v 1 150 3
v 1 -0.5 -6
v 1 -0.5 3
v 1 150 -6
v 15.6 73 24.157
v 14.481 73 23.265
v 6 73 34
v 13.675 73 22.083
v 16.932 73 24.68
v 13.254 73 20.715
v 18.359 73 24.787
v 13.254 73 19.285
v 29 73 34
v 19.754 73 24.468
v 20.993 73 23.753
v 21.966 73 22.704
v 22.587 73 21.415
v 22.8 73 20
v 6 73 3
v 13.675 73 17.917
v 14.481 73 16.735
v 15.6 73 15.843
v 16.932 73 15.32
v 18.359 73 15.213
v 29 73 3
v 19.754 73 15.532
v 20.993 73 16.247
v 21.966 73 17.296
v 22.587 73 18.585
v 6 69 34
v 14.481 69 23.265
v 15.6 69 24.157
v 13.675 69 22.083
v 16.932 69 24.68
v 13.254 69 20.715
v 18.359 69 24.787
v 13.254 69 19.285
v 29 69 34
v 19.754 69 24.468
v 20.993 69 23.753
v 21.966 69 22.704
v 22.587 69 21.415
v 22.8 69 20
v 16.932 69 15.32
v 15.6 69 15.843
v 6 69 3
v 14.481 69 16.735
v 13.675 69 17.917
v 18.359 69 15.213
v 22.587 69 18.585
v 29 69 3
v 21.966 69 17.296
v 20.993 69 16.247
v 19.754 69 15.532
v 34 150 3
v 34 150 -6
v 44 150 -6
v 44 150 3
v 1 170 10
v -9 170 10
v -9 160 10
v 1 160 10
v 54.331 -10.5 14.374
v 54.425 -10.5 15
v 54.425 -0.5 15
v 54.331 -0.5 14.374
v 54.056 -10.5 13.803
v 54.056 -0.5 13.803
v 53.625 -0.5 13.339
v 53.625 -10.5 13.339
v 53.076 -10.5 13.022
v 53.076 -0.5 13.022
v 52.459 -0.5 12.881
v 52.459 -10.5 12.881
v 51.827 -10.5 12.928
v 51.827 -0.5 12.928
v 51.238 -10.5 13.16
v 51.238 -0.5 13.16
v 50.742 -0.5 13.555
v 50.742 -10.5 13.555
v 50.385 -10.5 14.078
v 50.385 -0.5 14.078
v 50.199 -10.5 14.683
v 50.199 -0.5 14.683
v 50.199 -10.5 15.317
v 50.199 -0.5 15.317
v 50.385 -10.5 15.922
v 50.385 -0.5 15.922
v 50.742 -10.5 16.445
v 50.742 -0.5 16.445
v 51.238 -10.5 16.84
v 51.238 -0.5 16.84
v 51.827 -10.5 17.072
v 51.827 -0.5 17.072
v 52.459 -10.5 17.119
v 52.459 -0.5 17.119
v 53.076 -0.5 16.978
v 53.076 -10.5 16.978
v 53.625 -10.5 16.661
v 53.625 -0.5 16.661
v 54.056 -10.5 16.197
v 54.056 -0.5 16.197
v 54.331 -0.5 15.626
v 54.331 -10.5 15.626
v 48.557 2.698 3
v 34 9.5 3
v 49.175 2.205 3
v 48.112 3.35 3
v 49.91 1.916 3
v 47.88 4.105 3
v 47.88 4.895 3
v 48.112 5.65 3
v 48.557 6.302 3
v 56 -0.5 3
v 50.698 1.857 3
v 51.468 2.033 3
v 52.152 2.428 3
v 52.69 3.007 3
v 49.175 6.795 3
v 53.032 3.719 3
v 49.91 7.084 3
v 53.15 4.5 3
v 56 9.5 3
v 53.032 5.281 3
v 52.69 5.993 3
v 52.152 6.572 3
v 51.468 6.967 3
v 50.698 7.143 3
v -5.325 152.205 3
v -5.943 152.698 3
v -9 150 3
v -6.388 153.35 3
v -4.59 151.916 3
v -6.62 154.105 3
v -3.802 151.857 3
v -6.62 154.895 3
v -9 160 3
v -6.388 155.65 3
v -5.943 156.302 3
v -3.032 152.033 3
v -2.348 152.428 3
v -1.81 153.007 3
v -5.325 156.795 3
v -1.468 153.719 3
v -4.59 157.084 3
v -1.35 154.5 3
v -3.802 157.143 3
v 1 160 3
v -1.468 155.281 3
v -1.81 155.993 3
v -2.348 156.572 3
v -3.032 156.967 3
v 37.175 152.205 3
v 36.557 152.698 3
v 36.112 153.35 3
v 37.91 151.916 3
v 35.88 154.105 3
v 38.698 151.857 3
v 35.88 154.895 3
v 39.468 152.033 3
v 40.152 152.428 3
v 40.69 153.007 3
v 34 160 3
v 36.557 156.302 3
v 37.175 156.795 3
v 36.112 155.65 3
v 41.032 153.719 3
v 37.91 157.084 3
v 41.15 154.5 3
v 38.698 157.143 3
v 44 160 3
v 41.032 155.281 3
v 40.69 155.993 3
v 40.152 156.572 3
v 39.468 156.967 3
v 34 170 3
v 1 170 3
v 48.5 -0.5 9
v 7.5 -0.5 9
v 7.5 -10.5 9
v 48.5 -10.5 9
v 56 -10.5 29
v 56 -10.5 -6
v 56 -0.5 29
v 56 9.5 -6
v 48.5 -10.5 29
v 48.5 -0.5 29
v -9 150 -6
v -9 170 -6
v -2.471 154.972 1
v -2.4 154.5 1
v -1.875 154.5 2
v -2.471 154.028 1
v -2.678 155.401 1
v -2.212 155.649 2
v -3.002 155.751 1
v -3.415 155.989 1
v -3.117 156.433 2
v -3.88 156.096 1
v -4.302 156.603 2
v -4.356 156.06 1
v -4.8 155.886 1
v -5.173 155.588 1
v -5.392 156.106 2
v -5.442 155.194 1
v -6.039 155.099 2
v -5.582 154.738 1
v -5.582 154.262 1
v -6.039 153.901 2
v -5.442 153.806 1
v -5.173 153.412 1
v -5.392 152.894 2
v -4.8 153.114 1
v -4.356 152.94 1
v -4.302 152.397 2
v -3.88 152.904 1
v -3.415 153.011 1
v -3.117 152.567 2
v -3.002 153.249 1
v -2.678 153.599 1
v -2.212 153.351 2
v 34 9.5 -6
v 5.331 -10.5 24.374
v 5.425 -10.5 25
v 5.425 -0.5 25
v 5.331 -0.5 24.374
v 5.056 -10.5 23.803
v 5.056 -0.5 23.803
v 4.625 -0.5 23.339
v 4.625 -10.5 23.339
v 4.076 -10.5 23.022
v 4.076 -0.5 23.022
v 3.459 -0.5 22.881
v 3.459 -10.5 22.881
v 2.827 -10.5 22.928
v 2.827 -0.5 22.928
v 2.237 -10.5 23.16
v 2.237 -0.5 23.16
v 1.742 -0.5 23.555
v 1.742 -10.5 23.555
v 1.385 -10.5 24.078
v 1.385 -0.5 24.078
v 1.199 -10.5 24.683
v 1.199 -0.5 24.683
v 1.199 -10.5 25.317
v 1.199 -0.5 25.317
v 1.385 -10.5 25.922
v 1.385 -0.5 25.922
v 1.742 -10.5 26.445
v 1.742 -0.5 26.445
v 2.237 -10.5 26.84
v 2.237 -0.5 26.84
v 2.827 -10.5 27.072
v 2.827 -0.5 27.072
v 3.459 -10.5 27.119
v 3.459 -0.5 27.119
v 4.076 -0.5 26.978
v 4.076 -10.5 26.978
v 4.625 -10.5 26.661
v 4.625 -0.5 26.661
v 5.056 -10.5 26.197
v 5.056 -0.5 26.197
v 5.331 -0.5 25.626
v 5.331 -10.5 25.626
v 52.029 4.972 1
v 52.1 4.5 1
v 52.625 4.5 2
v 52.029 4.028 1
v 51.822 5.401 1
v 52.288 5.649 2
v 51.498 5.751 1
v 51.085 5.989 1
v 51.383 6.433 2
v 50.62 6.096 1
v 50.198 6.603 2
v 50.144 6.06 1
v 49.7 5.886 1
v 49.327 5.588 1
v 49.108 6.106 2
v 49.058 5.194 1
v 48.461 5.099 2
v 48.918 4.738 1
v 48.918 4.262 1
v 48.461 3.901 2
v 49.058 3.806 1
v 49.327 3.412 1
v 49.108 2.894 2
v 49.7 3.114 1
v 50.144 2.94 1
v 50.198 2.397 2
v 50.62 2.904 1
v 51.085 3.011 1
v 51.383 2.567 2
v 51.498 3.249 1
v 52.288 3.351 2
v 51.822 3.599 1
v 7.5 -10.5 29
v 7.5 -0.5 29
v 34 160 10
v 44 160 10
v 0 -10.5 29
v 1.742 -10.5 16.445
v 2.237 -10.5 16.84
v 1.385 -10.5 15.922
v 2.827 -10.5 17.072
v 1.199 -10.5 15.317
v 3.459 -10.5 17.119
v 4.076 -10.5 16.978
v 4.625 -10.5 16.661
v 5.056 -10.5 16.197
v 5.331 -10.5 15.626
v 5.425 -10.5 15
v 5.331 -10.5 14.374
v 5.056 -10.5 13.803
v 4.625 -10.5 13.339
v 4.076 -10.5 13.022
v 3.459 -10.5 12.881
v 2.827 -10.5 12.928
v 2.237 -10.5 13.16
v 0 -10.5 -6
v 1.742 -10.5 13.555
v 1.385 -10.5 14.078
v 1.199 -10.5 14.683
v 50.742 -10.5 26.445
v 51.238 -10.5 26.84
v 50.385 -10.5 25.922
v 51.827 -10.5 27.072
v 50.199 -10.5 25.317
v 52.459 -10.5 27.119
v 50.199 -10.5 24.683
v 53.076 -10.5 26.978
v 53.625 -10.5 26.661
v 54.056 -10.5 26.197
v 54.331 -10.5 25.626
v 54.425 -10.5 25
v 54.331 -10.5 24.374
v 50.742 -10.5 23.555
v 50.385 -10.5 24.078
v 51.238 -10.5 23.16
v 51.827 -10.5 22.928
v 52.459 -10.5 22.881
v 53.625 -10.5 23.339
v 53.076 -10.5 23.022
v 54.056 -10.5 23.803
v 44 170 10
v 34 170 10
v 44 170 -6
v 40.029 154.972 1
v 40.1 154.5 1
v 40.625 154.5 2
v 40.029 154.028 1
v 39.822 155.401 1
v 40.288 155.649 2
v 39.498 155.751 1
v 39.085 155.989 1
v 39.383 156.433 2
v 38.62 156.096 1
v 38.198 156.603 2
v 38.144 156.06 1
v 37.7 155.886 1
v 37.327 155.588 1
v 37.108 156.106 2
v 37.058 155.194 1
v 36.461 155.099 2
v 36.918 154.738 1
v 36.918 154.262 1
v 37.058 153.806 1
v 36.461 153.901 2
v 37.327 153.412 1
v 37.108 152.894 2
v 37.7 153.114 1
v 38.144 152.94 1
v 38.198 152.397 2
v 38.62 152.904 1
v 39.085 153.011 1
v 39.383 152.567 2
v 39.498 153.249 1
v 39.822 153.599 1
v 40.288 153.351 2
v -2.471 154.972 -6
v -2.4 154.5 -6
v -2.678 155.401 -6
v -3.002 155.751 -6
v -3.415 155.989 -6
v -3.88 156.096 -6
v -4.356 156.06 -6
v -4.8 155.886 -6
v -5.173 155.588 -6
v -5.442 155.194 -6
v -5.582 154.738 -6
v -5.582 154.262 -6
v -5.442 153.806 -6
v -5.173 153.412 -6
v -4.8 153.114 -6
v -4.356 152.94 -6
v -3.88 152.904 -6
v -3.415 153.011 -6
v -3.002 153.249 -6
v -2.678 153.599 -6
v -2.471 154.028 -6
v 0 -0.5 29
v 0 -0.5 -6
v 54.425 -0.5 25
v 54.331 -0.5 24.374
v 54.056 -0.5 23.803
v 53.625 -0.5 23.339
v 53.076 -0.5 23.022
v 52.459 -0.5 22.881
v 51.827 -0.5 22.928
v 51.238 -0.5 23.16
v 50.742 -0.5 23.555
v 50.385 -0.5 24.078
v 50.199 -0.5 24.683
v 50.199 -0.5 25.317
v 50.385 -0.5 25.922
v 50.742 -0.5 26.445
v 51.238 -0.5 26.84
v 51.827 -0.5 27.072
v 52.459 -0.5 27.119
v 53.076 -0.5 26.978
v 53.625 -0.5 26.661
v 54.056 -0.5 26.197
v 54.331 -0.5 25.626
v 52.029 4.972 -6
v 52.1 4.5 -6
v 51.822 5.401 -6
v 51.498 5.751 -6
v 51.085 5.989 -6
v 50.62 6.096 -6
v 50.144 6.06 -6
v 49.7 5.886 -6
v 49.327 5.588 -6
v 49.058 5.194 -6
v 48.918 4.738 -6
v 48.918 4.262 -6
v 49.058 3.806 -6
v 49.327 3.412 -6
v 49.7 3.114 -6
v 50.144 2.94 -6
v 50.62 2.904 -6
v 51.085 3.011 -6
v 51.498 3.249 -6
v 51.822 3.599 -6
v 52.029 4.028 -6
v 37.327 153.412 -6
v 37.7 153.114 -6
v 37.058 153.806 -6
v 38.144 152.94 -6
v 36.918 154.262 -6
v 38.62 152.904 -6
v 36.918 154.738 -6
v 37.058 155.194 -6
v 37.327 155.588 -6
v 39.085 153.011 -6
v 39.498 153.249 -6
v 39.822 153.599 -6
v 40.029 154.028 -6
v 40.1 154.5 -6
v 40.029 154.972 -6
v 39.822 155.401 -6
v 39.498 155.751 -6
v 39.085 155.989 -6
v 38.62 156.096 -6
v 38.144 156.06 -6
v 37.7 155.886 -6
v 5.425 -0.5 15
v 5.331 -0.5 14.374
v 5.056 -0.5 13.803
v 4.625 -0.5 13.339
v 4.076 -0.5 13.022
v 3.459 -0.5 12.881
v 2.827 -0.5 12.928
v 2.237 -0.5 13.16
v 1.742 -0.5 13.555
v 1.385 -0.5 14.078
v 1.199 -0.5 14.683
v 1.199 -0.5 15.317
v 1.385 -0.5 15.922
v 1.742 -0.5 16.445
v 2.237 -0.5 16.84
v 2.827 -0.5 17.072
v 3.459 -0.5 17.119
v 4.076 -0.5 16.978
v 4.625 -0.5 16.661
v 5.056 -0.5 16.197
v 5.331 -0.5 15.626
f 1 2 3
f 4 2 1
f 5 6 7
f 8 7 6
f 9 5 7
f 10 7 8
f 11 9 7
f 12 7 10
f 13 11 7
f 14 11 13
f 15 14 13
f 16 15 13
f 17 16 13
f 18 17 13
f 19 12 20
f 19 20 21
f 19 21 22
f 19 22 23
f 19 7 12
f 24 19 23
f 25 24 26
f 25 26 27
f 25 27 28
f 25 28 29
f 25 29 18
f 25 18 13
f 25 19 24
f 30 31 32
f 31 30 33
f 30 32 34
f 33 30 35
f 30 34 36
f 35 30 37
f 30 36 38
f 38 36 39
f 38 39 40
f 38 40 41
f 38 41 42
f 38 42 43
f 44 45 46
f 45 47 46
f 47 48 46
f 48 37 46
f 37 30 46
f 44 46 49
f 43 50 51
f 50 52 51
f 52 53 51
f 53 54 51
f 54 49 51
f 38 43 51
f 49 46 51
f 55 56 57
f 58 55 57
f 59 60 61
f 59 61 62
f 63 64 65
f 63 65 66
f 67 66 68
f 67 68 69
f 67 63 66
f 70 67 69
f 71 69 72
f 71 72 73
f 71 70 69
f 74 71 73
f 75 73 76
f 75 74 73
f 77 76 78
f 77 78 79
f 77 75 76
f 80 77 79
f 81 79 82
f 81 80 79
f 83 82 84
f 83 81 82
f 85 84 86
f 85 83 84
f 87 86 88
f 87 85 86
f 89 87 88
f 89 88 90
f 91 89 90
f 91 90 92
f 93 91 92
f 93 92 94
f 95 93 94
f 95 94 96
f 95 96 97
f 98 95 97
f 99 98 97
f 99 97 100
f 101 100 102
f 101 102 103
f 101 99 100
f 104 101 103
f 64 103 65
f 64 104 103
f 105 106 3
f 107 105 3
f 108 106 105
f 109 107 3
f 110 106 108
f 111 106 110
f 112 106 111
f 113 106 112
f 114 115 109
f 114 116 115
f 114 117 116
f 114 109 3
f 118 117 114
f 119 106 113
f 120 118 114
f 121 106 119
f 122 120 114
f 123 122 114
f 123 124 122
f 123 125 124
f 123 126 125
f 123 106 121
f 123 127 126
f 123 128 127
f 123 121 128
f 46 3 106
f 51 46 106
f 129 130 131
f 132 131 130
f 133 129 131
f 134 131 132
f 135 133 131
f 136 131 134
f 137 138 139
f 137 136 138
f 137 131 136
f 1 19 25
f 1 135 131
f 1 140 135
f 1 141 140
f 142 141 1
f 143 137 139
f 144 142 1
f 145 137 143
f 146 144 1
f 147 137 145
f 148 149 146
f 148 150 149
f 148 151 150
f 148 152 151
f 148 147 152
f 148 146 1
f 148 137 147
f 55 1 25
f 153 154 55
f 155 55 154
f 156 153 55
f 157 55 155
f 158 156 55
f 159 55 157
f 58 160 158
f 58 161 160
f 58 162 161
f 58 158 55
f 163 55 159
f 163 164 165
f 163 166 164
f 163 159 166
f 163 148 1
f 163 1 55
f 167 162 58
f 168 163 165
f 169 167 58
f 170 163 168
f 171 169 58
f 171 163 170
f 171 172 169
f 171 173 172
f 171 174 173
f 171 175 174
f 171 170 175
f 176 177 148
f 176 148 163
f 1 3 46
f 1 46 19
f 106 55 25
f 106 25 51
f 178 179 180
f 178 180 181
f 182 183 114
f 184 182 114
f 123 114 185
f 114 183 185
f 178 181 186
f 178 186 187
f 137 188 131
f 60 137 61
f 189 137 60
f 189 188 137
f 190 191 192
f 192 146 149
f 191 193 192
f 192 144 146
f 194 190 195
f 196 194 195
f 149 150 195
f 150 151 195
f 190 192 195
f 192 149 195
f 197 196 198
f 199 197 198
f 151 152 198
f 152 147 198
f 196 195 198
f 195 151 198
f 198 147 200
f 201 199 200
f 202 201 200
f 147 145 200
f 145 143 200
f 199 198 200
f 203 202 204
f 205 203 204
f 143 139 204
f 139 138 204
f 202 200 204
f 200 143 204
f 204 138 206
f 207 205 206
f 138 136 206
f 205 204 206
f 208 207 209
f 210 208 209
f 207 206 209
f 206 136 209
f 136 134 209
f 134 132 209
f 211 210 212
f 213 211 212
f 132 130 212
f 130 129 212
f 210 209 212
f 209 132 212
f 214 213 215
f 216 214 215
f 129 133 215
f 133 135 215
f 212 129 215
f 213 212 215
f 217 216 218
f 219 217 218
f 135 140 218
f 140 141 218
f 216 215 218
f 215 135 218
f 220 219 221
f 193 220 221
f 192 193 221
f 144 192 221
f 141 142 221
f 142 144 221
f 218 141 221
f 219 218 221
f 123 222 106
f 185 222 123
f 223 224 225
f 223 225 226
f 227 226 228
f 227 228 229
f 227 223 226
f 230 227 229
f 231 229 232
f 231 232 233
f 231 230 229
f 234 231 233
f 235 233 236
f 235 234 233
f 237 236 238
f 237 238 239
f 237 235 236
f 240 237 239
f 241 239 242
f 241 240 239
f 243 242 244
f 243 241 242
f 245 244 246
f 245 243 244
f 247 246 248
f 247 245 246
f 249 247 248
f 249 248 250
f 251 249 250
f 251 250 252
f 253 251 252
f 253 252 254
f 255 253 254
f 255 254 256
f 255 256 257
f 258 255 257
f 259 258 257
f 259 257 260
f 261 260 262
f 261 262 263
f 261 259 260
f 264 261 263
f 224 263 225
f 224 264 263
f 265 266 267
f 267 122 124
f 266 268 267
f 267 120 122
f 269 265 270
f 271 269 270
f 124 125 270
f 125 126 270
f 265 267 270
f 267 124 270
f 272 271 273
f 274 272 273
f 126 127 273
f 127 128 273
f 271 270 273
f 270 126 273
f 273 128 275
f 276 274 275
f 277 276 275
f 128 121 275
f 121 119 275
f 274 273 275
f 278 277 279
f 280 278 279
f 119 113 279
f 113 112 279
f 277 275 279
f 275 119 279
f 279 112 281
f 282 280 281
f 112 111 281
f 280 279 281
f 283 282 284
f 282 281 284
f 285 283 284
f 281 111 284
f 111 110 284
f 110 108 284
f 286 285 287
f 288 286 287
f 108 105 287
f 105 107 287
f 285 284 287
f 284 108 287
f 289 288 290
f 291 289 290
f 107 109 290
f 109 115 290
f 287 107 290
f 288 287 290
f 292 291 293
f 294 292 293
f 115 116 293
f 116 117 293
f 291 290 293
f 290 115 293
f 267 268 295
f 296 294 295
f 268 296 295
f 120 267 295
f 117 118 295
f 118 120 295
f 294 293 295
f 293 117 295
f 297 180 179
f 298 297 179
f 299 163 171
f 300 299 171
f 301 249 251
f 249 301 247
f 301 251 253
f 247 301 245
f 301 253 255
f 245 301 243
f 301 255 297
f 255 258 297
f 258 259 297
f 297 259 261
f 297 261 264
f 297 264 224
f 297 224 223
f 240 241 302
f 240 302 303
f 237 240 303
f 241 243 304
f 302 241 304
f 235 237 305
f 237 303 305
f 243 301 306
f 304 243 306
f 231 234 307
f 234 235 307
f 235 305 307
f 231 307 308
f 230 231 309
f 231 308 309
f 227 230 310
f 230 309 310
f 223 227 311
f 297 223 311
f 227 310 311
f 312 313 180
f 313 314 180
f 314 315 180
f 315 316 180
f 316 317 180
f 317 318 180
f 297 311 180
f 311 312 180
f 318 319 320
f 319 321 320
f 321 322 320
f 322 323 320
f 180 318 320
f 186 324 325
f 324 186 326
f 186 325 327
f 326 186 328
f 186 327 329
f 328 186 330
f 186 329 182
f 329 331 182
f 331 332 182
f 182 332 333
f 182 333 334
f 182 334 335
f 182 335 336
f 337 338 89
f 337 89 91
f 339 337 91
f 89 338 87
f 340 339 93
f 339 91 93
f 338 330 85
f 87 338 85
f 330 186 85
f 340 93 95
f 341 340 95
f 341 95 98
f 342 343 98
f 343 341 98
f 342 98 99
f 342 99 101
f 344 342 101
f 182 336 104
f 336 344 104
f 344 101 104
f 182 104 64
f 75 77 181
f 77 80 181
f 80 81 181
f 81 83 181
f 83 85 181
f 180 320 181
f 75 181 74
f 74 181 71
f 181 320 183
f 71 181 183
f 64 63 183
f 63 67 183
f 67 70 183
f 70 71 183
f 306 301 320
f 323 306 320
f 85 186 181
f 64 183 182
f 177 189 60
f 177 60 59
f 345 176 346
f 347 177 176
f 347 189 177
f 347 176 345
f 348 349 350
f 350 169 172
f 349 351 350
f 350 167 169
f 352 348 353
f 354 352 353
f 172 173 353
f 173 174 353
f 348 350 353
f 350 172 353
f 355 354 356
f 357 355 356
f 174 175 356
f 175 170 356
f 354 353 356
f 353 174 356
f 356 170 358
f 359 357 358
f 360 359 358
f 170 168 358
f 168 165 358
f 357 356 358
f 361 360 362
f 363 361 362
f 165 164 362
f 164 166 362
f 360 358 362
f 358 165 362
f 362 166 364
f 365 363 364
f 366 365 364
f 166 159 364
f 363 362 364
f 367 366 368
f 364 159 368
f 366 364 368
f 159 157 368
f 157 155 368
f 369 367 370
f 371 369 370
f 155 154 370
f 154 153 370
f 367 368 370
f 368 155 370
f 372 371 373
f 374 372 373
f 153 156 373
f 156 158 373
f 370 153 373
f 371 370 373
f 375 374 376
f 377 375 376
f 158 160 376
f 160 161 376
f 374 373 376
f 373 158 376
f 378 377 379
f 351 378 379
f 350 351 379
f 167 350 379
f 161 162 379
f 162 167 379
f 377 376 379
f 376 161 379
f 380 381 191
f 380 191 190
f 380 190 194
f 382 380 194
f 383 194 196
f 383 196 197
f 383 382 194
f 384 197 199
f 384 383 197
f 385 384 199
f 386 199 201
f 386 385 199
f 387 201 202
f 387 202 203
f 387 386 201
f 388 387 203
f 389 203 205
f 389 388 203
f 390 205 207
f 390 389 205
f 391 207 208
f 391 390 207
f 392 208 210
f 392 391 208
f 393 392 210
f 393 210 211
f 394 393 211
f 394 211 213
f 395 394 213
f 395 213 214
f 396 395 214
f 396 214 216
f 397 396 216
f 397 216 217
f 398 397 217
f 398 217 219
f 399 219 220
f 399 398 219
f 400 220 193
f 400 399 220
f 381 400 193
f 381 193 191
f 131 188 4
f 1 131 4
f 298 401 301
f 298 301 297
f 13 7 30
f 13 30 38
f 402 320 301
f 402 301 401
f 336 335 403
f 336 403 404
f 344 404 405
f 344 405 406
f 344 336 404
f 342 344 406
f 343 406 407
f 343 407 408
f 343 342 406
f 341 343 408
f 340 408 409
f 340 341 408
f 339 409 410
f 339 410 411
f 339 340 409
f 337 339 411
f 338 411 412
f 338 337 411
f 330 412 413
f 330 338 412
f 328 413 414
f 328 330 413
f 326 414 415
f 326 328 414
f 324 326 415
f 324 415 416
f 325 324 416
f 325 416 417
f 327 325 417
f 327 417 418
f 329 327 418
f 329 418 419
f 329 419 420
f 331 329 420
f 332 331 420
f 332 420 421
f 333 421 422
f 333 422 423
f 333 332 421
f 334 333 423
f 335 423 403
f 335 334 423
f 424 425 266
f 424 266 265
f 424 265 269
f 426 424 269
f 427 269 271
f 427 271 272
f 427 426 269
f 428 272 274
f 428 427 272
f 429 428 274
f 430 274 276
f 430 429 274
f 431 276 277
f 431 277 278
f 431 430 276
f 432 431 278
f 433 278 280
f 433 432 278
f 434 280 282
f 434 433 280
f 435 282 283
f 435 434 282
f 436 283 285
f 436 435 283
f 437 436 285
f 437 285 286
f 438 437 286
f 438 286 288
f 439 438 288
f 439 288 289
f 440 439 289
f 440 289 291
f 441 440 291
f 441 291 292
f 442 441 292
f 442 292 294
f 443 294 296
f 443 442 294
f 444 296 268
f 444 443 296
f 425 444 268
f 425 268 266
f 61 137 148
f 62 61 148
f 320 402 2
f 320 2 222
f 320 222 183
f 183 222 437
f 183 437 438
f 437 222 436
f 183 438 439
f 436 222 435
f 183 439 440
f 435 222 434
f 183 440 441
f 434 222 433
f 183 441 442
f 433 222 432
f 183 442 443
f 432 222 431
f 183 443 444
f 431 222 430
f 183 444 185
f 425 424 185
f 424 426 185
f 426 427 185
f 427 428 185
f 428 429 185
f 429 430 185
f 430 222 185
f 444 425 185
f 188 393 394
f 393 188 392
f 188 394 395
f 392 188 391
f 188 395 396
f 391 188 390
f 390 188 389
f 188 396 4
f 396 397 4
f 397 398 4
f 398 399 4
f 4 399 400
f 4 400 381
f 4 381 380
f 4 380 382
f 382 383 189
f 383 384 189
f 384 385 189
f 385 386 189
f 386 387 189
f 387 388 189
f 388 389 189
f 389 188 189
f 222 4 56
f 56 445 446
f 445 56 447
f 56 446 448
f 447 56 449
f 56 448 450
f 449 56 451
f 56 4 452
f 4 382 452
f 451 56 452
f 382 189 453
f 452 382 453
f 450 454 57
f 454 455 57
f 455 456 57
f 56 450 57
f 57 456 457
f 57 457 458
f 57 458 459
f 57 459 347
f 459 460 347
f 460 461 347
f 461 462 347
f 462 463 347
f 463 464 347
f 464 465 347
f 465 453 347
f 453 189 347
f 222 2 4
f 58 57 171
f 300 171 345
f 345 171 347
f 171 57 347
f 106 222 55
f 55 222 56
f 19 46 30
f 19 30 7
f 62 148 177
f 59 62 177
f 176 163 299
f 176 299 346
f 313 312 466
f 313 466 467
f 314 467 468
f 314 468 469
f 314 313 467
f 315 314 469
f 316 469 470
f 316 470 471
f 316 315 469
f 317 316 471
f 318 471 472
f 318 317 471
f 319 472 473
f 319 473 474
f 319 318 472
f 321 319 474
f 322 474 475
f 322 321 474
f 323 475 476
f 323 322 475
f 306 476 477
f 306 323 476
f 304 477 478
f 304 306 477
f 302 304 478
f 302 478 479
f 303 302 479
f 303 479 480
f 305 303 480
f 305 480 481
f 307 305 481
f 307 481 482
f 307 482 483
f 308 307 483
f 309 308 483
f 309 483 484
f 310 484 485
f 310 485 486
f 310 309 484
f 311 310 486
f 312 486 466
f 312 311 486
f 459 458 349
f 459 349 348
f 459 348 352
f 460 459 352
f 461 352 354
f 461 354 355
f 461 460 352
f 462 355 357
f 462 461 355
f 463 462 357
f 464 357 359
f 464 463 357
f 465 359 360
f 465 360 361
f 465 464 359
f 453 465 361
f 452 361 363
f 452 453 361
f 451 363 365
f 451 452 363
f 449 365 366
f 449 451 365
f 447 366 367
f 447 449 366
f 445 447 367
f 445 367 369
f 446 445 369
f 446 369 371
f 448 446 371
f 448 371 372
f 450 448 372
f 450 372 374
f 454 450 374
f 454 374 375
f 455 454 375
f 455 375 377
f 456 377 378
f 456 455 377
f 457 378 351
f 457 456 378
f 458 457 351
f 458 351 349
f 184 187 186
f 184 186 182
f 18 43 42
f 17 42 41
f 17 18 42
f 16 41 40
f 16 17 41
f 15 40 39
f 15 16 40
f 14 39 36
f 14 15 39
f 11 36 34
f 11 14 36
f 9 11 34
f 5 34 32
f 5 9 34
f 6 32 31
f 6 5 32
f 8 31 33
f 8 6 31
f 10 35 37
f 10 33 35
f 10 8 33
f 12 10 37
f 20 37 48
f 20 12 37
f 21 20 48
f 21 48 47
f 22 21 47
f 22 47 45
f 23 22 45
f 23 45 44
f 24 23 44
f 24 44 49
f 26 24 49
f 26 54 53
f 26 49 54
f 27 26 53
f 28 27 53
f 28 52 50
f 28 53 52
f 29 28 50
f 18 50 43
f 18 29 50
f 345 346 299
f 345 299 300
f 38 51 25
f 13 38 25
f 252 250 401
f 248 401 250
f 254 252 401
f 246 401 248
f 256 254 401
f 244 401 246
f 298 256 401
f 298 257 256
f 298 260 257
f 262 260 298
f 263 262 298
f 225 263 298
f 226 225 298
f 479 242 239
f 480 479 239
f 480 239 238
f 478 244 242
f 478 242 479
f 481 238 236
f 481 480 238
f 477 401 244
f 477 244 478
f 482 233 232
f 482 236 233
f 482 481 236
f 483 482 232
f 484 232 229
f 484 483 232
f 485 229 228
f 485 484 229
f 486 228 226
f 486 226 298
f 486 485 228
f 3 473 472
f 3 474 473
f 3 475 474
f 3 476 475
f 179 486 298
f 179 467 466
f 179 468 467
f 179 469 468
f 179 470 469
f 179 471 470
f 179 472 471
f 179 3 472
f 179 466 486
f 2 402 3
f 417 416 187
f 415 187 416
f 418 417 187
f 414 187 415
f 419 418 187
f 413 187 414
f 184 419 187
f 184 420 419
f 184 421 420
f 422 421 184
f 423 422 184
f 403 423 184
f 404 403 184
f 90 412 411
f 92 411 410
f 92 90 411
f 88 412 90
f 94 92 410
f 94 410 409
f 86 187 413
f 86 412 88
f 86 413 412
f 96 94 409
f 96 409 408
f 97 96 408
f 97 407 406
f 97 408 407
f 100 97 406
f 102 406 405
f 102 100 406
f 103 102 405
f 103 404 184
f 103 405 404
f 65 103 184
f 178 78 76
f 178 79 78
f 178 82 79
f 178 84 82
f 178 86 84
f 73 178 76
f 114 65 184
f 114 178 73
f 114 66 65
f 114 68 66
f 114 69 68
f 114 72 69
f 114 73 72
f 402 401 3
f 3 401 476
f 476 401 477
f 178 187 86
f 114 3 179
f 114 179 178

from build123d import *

# Parameters (mm, degrees)
CYLINDER148_R     = 4.8
CYLINDER148_DEPTH = 6.7
CYLINDER147_R     = 1.6
CYLINDER147_DEPTH = 7
CYLINDER146_R     = 1.6
CYLINDER146_DEPTH = 7
CYLINDER140_R     = 1.6
CYLINDER140_DEPTH = 7
CYLINDER012_R     = 2.125
CYLINDER012_DEPTH = 10
CYLINDER013_R     = 2.125
CYLINDER013_DEPTH = 10
CYLINDER010_R     = 2.125
CYLINDER010_DEPTH = 10
CYLINDER011_R     = 2.125
CYLINDER011_DEPTH = 10
CYLINDER145_R     = 3.45
CYLINDER145_DEPTH = 10
CYLINDER141_R     = 1.6
CYLINDER141_DEPTH = 7
CYLINDER142_R     = 1.6
CYLINDER142_DEPTH = 7
CYLINDER144_R     = 1.6
CYLINDER144_DEPTH = 7
CYLINDER143_R     = 1.6
CYLINDER143_DEPTH = 7
BOX007_W          = 41
BOX007_H          = 10
BOX007_DEPTH      = 20
BOX006_W          = 56
BOX006_H          = 10
BOX006_DEPTH      = 26
BOX005_W          = 23
BOX005_H          = 4
BOX005_DEPTH      = 31
BOX008_W          = 22
BOX008_H          = 10
BOX008_DEPTH      = 9
BOX009_W          = 1
BOX009_H          = 10
BOX009_DEPTH      = 9
BOX012_W          = 10
BOX012_H          = 10
BOX012_DEPTH      = 16
BOX013_W          = 10
BOX013_H          = 10
BOX013_DEPTH      = 16
BOX014_W          = 22
BOX014_H          = 10
BOX014_DEPTH      = 9
BOX015_W          = 10
BOX015_H          = 10
BOX015_DEPTH      = 9
BOX016_W          = 10
BOX016_H          = 10
BOX016_DEPTH      = 9
BOX003_W          = 33
BOX003_H          = 180.5
BOX003_DEPTH      = 9


with BuildPart() as hole002:
    # Cylinder148 → Cylinder148 (new body)
    with BuildSketch(Plane(origin=(18, 73, 20), x_dir=(1, 0, 0), z_dir=(0, -1, 0))):
        Circle(CYLINDER148_R)
    extrude(amount=CYLINDER148_DEPTH)


with BuildPart() as wheelscrew018:
    # Cylinder147 → Cylinder147 (new body)
    with BuildSketch(Plane(origin=(9, -124, -19), x_dir=(1, 0, 0), z_dir=(0, 0, 1))):
        Circle(CYLINDER147_R)
    extrude(amount=CYLINDER147_DEPTH)


with BuildPart() as fullscrew007:
    # Cone015 → Cone015 (revolve)
    with BuildSketch(Plane(origin=(9, -124, -12), x_dir=(1, 0, 0), z_dir=(0, -1, 0))):
        Polygon((0, 0), (1.6, 0), (2.65, 2), (0, 2), align=None)
    revolve(axis=Axis((9, -124, -12), (0, 0, 1)))

    # Fusion007051: union wheelScrew018
    add(wheelscrew018.part)


with BuildPart() as fullscrew007_1:
    # Fusion007051 placement: moved
    add(fullscrew007.part.moved(Location((41.5, 128.5, 13))))


with BuildPart() as wheelscrew016:
    # Cylinder146 → Cylinder146 (new body)
    with BuildSketch(Plane(origin=(9, -124, -19), x_dir=(1, 0, 0), z_dir=(0, 0, 1))):
        Circle(CYLINDER146_R)
    extrude(amount=CYLINDER146_DEPTH)


with BuildPart() as fullscrew006:
    # Cone014 → Cone014 (revolve)
    with BuildSketch(Plane(origin=(9, -124, -12), x_dir=(1, 0, 0), z_dir=(0, -1, 0))):
        Polygon((0, 0), (1.6, 0), (2.65, 2), (0, 2), align=None)
    revolve(axis=Axis((9, -124, -12), (0, 0, 1)))

    # Fusion007050: union wheelScrew016
    add(wheelscrew016.part)


with BuildPart() as fullscrew006_1:
    # Fusion007050 placement: moved
    add(fullscrew006.part.moved(Location((-13, 278.5, 13))))


with BuildPart() as wheelscrew005:
    # Cylinder140 → Cylinder140 (new body)
    with BuildSketch(Plane(origin=(9, -124, -19), x_dir=(1, 0, 0), z_dir=(0, 0, 1))):
        Circle(CYLINDER140_R)
    extrude(amount=CYLINDER140_DEPTH)


with BuildPart() as fullscrew001:
    # Cone009 → Cone009 (revolve)
    with BuildSketch(Plane(origin=(9, -124, -12), x_dir=(1, 0, 0), z_dir=(0, -1, 0))):
        Polygon((0, 0), (1.6, 0), (2.65, 2), (0, 2), align=None)
    revolve(axis=Axis((9, -124, -12), (0, 0, 1)))

    # Fusion007043: union wheelScrew005
    add(wheelscrew005.part)


with BuildPart() as fullscrew001_1:
    # Fusion007043 placement: moved
    add(fullscrew001.part.moved(Location((29.5, 278.5, 13))))


with BuildPart() as servoattach003:
    # Cylinder012 → Cylinder012 (new body)
    with BuildSketch(Plane(origin=(52.3, -10.5, 25), x_dir=(1, 0, 0), z_dir=(0, 1, 0))):
        Circle(CYLINDER012_R)
    extrude(amount=CYLINDER012_DEPTH)


with BuildPart() as servoattach004:
    # Cylinder013 → Cylinder013 (new body)
    with BuildSketch(Plane(origin=(52.3, -10.5, 15), x_dir=(1, 0, 0), z_dir=(0, 1, 0))):
        Circle(CYLINDER013_R)
    extrude(amount=CYLINDER013_DEPTH)


with BuildPart() as servoattach001:
    # Cylinder010 → Cylinder010 (new body)
    with BuildSketch(Plane(origin=(3.3, -10.5, 25), x_dir=(1, 0, 0), z_dir=(0, 1, 0))):
        Circle(CYLINDER010_R)
    extrude(amount=CYLINDER010_DEPTH)


with BuildPart() as servoattach002:
    # Cylinder011 → Cylinder011 (new body)
    with BuildSketch(Plane(origin=(3.3, -10.5, 15), x_dir=(1, 0, 0), z_dir=(0, 1, 0))):
        Circle(CYLINDER011_R)
    extrude(amount=CYLINDER011_DEPTH)


with BuildPart() as insert001:
    # Cylinder145 → Cylinder145 (new body)
    with BuildSketch(Plane(origin=(17.5, 180.5, -7), x_dir=(1, 0, 0), z_dir=(0, 0, 1))):
        Circle(CYLINDER145_R)
    extrude(amount=CYLINDER145_DEPTH)


with BuildPart() as wheelscrew008:
    # Cylinder141 → Cylinder141 (new body)
    with BuildSketch(Plane(origin=(9, -124, -19), x_dir=(1, 0, 0), z_dir=(0, 0, 1))):
        Circle(CYLINDER141_R)
    extrude(amount=CYLINDER141_DEPTH)


with BuildPart() as fullscrew002:
    # Cone010 → Cone010 (revolve)
    with BuildSketch(Plane(origin=(9, -124, -12), x_dir=(1, 0, 0), z_dir=(0, -1, 0))):
        Polygon((0, 0), (1.6, 0), (2.65, 2), (0, 2), align=None)
    revolve(axis=Axis((9, -124, -12), (0, 0, 1)))

    # Fusion007045: union wheelScrew008
    add(wheelscrew008.part)


with BuildPart() as fullscrew002_1:
    # Fusion007045 placement: moved
    add(fullscrew002.part.moved(Location((17, 318, 13))))


with BuildPart() as wheelscrew010:
    # Cylinder142 → Cylinder142 (new body)
    with BuildSketch(Plane(origin=(9, -124, -19), x_dir=(1, 0, 0), z_dir=(0, 0, 1))):
        Circle(CYLINDER142_R)
    extrude(amount=CYLINDER142_DEPTH)


with BuildPart() as fullscrew003:
    # Cone011 → Cone011 (revolve)
    with BuildSketch(Plane(origin=(9, -124, -12), x_dir=(1, 0, 0), z_dir=(0, -1, 0))):
        Polygon((0, 0), (1.6, 0), (2.65, 2), (0, 2), align=None)
    revolve(axis=Axis((9, -124, -12), (0, 0, 1)))

    # Fusion007046: union wheelScrew010
    add(wheelscrew010.part)


with BuildPart() as fullscrew003_1:
    # Fusion007046 placement: moved
    add(fullscrew003.part.moved(Location((-1, 318, 13))))


with BuildPart() as wheelscrew014:
    # Cylinder144 → Cylinder144 (new body)
    with BuildSketch(Plane(origin=(9, -124, -19), x_dir=(1, 0, 0), z_dir=(0, 0, 1))):
        Circle(CYLINDER144_R)
    extrude(amount=CYLINDER144_DEPTH)


with BuildPart() as fullscrew005:
    # Cone013 → Cone013 (revolve)
    with BuildSketch(Plane(origin=(9, -124, -12), x_dir=(1, 0, 0), z_dir=(0, -1, 0))):
        Polygon((0, 0), (1.6, 0), (2.65, 2), (0, 2), align=None)
    revolve(axis=Axis((9, -124, -12), (0, 0, 1)))

    # Fusion007048: union wheelScrew014
    add(wheelscrew014.part)


with BuildPart() as fullscrew005_1:
    # Fusion007048 placement: moved
    add(fullscrew005.part.moved(Location((17, 88, 13))))


with BuildPart() as wheelscrew012:
    # Cylinder143 → Cylinder143 (new body)
    with BuildSketch(Plane(origin=(9, -124, -19), x_dir=(1, 0, 0), z_dir=(0, 0, 1))):
        Circle(CYLINDER143_R)
    extrude(amount=CYLINDER143_DEPTH)


with BuildPart() as fullscrew004:
    # Cone012 → Cone012 (revolve)
    with BuildSketch(Plane(origin=(9, -124, -12), x_dir=(1, 0, 0), z_dir=(0, -1, 0))):
        Polygon((0, 0), (1.6, 0), (2.65, 2), (0, 2), align=None)
    revolve(axis=Axis((9, -124, -12), (0, 0, 1)))

    # Fusion007047: union wheelScrew012
    add(wheelscrew012.part)


with BuildPart() as fullscrew004_1:
    # Fusion007047 placement: moved
    add(fullscrew004.part.moved(Location((-1, 88, 13))))


with BuildPart() as frame005:
    # Box007 → Box007 (new body)
    with BuildSketch(Plane(origin=(7.5, -10.5, 9), x_dir=(1, 0, 0), z_dir=(0, 0, 1))):
        with Locations((20.5, 5)):
            Rectangle(BOX007_W, BOX007_H)
    extrude(amount=BOX007_DEPTH)


with BuildPart() as cut005:
    # Box006 → Box006 (new body)
    with BuildSketch(Plane(origin=(0, -10.5, 3), x_dir=(1, 0, 0), z_dir=(0, 0, 1))):
        with Locations((28, 5)):
            Rectangle(BOX006_W, BOX006_H)
    extrude(amount=BOX006_DEPTH)

    # Cut005: cut frame005
    add(frame005.part, mode=Mode.SUBTRACT)


with BuildPart() as frame003:
    # Box005 → Box005 (new body)
    with BuildSketch(Plane(origin=(6, 69, 3), x_dir=(1, 0, 0), z_dir=(0, 0, 1))):
        with Locations((11.5, 2)):
            Rectangle(BOX005_W, BOX005_H)
    extrude(amount=BOX005_DEPTH)


with BuildPart() as frame006:
    # Box008 → Box008 (new body)
    with BuildSketch(Plane(origin=(34, -10.5, -6), x_dir=(1, 0, 0), z_dir=(0, 0, 1))):
        with Locations((11, 5)):
            Rectangle(BOX008_W, BOX008_H)
    extrude(amount=BOX008_DEPTH)


with BuildPart() as frame007:
    # Box009 → Box009 (new body)
    with BuildSketch(Plane(origin=(0, -10.5, -6), x_dir=(1, 0, 0), z_dir=(0, 0, 1))):
        with Locations((0.5, 5)):
            Rectangle(BOX009_W, BOX009_H)
    extrude(amount=BOX009_DEPTH)


with BuildPart() as frame008:
    # Box012 → Box012 (new body)
    with BuildSketch(Plane(origin=(34, 160, -6), x_dir=(1, 0, 0), z_dir=(0, 0, 1))):
        with Locations((5, 5)):
            Rectangle(BOX012_W, BOX012_H)
    extrude(amount=BOX012_DEPTH)


with BuildPart() as frame009:
    # Box013 → Box013 (new body)
    with BuildSketch(Plane(origin=(-9, 160, -6), x_dir=(1, 0, 0), z_dir=(0, 0, 1))):
        with Locations((5, 5)):
            Rectangle(BOX013_W, BOX013_H)
    extrude(amount=BOX013_DEPTH)


with BuildPart() as frame010:
    # Box014 → Box014 (new body)
    with BuildSketch(Plane(origin=(34, -0.5, -6), x_dir=(1, 0, 0), z_dir=(0, 0, 1))):
        with Locations((11, 5)):
            Rectangle(BOX014_W, BOX014_H)
    extrude(amount=BOX014_DEPTH)


with BuildPart() as frame011:
    # Box015 → Box015 (new body)
    with BuildSketch(Plane(origin=(34, 150, -6), x_dir=(1, 0, 0), z_dir=(0, 0, 1))):
        with Locations((5, 5)):
            Rectangle(BOX015_W, BOX015_H)
    extrude(amount=BOX015_DEPTH)


with BuildPart() as frame012:
    # Box016 → Box016 (new body)
    with BuildSketch(Plane(origin=(-9, 150, -6), x_dir=(1, 0, 0), z_dir=(0, 0, 1))):
        with Locations((5, 5)):
            Rectangle(BOX016_W, BOX016_H)
    extrude(amount=BOX016_DEPTH)


with BuildPart() as base004:
    # Box003 → Box003 (new body)
    with BuildSketch(Plane(origin=(1, -10.5, -6), x_dir=(1, 0, 0), z_dir=(0, 0, 1))):
        with Locations((16.5, 90.25)):
            Rectangle(BOX003_W, BOX003_H)
    extrude(amount=BOX003_DEPTH)

    # Fusion007049: union Cut005, frame003, frame006, frame007, frame008, frame009, frame010, frame011, frame012
    add(cut005.part)
    add(frame003.part)
    add(frame006.part)
    add(frame007.part)
    add(frame008.part)
    add(frame009.part)
    add(frame010.part)
    add(frame011.part)
    add(frame012.part)

    # Cut006: cut fullScrew004
    add(fullscrew004_1.part, mode=Mode.SUBTRACT)

    # Cut007: cut fullScrew005
    add(fullscrew005_1.part, mode=Mode.SUBTRACT)

    # Cut008: cut fullScrew003
    add(fullscrew003_1.part, mode=Mode.SUBTRACT)

    # Cut009: cut fullScrew002
    add(fullscrew002_1.part, mode=Mode.SUBTRACT)

    # Cut010: cut insert001
    add(insert001.part, mode=Mode.SUBTRACT)

    # Cut011: cut servoAttach002
    add(servoattach002.part, mode=Mode.SUBTRACT)

    # Cut012: cut servoAttach001
    add(servoattach001.part, mode=Mode.SUBTRACT)

    # Cut013: cut servoAttach004
    add(servoattach004.part, mode=Mode.SUBTRACT)

    # Cut014: cut servoAttach003
    add(servoattach003.part, mode=Mode.SUBTRACT)

    # Cut015: cut fullScrew001
    add(fullscrew001_1.part, mode=Mode.SUBTRACT)

    # Cut016: cut fullScrew006
    add(fullscrew006_1.part, mode=Mode.SUBTRACT)

    # Cut017: cut fullScrew007
    add(fullscrew007_1.part, mode=Mode.SUBTRACT)

    # Cut018: cut hole002
    add(hole002.part, mode=Mode.SUBTRACT)


solid = base004.part
